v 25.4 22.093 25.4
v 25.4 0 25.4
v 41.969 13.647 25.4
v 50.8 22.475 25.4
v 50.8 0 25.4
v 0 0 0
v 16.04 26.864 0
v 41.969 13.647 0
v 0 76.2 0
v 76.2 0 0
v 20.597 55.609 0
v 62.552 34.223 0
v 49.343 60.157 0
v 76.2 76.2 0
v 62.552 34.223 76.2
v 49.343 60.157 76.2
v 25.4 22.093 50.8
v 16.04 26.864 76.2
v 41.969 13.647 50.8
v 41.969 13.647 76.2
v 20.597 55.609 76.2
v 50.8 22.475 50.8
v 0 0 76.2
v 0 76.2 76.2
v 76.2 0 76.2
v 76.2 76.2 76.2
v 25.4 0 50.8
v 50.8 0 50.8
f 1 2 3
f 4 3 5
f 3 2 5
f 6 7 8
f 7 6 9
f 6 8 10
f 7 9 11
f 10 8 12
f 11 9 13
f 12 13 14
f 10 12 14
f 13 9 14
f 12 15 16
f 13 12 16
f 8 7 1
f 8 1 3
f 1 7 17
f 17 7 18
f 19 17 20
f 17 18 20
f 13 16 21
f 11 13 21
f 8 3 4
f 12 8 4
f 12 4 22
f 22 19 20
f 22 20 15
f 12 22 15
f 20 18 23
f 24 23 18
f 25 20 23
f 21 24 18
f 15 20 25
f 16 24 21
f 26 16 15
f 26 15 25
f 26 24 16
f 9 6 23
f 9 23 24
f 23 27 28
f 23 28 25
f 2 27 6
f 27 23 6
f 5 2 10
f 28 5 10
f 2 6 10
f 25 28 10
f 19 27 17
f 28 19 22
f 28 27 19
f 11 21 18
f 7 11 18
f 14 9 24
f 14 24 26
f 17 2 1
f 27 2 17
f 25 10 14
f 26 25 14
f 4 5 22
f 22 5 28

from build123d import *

# Parameters (mm, degrees)
F0_W     = 76.2
F0_H     = 76.2
F1_DEPTH = 76.2
F3_DEPTH = 76.201
F4_W     = 25.4
F4_H     = 25.4
F5_DEPTH = 12.7
F6_DEPTH = 25.4


with BuildPart() as f1:
    # F0 (on Top) → F1 (new body)
    with BuildSketch(Plane.XY):
        with Locations((38.1, 38.1)):
            Rectangle(F0_W, F0_H)
    extrude(amount=F1_DEPTH)

    # F2 (on face) → F3 (cut, through all)
    with BuildSketch(Plane.XY.offset(76.2)):
        Polygon((41.968848, 13.647208), (62.551527, 34.223165), (49.343027, 60.156776), (20.597046, 55.608672), (16.039553, 26.864179), align=None)
    extrude(amount=-F3_DEPTH, mode=Mode.SUBTRACT)

    # F4 (on face) → F5 (cut)
    with BuildSketch(Plane.XZ):
        with Locations((38.1, 38.1)):
            Rectangle(F4_W, F4_H)
    extrude(amount=-F5_DEPTH, mode=Mode.SUBTRACT)

    # F4 (on face) → F6 (cut)
    with BuildSketch(Plane.XZ):
        with Locations((38.1, 38.1)):
            Rectangle(F4_W, F4_H)
    extrude(amount=-F6_DEPTH, mode=Mode.SUBTRACT)


solid = f1.part
